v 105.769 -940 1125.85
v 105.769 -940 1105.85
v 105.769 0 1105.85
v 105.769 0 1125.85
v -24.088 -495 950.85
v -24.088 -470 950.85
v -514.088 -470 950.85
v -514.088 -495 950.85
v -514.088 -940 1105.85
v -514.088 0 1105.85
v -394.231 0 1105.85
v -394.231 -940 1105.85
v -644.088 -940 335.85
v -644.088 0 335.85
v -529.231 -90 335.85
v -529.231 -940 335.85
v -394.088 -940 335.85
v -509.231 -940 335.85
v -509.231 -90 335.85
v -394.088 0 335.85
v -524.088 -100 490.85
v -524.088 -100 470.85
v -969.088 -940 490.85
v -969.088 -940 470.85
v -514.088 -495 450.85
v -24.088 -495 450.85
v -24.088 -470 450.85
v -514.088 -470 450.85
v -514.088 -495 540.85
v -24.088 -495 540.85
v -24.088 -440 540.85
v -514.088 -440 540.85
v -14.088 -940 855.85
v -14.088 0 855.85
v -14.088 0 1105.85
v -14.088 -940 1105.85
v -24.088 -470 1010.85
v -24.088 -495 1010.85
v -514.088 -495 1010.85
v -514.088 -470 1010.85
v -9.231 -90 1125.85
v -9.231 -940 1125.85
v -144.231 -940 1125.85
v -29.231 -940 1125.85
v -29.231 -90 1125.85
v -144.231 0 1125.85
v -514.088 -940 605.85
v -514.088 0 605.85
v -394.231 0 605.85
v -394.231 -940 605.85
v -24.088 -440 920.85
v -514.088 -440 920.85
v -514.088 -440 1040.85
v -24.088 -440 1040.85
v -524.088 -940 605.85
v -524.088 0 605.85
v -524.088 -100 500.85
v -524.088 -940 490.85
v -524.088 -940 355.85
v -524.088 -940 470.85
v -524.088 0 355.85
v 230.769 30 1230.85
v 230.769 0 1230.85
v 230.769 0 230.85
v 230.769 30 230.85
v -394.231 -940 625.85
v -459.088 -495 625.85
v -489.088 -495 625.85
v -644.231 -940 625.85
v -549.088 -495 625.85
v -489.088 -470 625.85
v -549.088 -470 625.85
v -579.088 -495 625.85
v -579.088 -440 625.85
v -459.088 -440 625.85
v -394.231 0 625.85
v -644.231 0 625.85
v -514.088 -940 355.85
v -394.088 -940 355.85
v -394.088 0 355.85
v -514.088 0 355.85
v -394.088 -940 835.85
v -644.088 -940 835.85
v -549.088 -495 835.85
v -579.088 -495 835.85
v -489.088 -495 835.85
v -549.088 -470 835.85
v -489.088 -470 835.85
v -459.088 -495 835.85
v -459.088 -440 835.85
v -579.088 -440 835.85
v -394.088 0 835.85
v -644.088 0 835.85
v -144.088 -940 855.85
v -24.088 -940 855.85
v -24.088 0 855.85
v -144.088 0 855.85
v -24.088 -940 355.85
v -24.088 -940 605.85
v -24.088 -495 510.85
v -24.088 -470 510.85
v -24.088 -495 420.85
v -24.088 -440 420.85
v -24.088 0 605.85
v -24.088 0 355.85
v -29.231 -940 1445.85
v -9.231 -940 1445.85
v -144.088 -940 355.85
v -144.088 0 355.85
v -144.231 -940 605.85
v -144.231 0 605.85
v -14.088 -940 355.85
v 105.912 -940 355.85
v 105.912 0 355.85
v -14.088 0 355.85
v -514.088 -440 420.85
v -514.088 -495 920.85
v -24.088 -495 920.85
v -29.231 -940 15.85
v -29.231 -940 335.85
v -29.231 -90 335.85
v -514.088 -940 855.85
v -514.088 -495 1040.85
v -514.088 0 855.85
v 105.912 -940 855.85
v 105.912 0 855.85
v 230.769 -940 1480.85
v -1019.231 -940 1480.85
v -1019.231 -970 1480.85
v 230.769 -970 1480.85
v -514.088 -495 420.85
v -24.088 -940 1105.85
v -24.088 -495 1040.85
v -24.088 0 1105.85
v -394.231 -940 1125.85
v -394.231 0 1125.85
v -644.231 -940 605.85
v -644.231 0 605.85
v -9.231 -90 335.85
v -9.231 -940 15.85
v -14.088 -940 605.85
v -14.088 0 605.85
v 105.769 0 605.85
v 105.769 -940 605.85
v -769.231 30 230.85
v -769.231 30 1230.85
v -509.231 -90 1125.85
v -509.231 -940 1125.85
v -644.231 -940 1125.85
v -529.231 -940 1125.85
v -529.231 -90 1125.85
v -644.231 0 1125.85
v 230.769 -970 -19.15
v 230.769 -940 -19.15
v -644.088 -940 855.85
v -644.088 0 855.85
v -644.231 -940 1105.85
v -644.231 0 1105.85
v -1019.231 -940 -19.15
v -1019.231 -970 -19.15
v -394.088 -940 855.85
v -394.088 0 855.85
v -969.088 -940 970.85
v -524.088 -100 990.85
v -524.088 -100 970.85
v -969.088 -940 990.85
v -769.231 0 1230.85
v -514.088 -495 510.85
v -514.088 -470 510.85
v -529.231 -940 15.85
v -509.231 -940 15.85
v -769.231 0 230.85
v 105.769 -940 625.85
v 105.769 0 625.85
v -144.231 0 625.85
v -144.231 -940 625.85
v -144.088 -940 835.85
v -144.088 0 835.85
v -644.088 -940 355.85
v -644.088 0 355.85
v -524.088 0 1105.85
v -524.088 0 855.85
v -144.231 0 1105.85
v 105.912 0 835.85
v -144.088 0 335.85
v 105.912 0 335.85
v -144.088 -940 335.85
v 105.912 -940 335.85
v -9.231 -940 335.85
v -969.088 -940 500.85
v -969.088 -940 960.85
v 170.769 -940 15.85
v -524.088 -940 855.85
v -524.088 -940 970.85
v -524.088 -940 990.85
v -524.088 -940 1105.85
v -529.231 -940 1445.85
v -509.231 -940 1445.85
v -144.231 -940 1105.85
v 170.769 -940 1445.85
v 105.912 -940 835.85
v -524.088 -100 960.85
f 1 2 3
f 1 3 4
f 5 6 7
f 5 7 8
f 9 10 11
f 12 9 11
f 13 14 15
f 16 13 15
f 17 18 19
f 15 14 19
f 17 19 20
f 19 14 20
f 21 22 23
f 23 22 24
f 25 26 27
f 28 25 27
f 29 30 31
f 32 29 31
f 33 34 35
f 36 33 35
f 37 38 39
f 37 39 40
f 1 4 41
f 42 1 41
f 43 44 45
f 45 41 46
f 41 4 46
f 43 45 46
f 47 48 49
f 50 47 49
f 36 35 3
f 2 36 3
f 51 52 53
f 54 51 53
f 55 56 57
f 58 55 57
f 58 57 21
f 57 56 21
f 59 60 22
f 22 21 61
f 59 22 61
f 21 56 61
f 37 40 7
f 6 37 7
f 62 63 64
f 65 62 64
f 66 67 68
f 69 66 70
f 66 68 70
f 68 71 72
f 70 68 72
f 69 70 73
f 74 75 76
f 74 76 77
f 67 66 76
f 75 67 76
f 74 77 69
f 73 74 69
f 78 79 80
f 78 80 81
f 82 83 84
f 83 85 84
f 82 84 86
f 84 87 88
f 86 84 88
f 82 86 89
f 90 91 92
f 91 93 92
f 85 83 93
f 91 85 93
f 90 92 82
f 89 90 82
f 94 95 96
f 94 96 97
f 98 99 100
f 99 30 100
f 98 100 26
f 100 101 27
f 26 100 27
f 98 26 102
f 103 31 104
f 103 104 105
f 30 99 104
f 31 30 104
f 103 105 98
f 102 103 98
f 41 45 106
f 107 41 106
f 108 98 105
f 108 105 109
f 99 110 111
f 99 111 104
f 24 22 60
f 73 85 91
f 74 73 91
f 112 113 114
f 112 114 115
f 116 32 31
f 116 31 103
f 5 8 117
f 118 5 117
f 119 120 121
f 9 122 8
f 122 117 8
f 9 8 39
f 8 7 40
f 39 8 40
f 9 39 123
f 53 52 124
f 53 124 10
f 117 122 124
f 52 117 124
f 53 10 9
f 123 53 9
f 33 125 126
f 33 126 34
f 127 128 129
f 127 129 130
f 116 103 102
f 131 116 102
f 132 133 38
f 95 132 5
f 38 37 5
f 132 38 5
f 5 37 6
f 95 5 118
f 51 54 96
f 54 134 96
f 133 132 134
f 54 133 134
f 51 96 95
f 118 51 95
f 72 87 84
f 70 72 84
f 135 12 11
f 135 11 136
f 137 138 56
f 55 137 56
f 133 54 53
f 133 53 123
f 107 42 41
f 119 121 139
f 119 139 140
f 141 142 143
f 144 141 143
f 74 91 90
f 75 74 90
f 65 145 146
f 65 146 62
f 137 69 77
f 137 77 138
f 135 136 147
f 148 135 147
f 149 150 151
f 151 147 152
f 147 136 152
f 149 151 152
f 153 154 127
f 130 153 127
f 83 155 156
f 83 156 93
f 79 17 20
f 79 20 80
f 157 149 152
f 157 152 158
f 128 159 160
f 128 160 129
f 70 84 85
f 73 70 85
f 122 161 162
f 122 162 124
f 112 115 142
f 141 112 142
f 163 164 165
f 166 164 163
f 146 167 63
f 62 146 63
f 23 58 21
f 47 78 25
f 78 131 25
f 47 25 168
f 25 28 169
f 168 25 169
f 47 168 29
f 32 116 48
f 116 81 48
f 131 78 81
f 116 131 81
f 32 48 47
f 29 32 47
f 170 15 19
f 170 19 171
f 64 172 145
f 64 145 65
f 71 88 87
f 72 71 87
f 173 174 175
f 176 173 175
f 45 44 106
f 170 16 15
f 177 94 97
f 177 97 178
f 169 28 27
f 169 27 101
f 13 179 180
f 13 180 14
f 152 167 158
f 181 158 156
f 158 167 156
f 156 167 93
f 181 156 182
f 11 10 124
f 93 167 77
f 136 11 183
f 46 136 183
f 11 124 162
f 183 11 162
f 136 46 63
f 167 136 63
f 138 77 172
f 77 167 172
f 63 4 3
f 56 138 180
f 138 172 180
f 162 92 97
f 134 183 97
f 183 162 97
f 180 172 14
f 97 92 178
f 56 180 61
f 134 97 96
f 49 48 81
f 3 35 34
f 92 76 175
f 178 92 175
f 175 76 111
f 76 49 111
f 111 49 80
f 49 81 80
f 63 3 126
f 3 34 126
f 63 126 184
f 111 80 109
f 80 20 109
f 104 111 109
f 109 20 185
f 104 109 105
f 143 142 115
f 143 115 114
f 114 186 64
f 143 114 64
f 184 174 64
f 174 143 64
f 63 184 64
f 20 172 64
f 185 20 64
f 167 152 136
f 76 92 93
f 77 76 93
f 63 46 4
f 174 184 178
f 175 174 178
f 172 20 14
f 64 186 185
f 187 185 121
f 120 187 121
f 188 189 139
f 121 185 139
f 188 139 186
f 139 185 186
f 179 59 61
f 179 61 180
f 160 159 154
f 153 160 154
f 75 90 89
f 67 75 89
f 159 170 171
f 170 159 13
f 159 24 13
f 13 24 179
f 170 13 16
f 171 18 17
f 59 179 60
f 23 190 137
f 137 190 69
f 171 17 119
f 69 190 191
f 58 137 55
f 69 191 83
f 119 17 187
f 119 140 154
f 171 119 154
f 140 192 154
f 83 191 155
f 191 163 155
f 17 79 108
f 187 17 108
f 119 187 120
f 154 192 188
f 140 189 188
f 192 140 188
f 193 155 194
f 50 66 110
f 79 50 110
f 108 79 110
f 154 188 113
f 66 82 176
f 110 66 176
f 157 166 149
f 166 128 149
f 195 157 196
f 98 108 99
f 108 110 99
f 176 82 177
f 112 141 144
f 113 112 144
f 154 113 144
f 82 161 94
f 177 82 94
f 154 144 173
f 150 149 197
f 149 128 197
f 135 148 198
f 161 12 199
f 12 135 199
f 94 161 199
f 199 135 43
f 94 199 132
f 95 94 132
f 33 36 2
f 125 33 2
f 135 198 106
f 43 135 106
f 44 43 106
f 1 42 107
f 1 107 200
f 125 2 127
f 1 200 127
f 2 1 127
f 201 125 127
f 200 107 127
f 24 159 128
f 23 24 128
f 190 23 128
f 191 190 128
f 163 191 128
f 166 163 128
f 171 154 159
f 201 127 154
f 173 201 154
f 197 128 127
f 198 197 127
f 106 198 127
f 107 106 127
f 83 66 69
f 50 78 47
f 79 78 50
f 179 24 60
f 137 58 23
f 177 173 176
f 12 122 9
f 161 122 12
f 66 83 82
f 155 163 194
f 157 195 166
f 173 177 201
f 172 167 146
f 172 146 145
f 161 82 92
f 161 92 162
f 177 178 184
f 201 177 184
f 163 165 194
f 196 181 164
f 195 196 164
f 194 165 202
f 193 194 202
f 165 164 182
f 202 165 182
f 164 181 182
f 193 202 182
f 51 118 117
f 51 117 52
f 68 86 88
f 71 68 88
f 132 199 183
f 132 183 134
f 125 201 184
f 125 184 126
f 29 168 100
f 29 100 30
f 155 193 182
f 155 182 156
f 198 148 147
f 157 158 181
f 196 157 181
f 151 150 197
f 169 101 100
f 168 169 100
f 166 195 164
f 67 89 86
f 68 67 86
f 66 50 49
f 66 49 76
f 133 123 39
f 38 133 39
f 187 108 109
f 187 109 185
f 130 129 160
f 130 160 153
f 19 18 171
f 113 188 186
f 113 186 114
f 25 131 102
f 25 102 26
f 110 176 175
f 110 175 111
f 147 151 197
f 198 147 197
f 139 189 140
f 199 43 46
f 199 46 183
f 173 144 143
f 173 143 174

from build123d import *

# Parameters (mm, degrees)
SKETCH5_W           = 1000
SKETCH5_H           = 1000
BOSS_EXTRUDE1_DEPTH = 30
BOSS_EXTRUDE2_DEPTH = 940
SKETCH7_W           = 1250
SKETCH7_H           = 1500
BOSS_EXTRUDE3_DEPTH = 30
BOSS_EXTRUDE4_DEPTH = 445
CUT_EXTRUDE2_DEPTH  = 30
CUT_EXTRUDE3_DEPTH  = 30
SKETCH12_W          = 20
SKETCH12_H          = 850
BOSS_EXTRUDE5_DEPTH = 320
CUT_EXTRUDE4_DEPTH  = 700
BOSS_EXTRUDE6_DEPTH = 210
BOSS_EXTRUDE7_DEPTH = 490


with BuildPart() as part:
    # Sketch5 → Boss-Extrude1 (new body)
    with BuildSketch(Plane(origin=(0, 0, 0), x_dir=(1, 0, 0), z_dir=(0, 1, 0))):
        with Locations((-269.230769231, -730.850115694)):
            Rectangle(SKETCH5_W, SKETCH5_H)
    extrude(amount=BOSS_EXTRUDE1_DEPTH)

    # Sketch6 → Boss-Extrude2 (add)
    with BuildSketch(Plane.XZ):
        Polygon((-644.230769231, 625.850115694), (-644.230769231, 605.850115694), (-524.088400017, 605.850115694), (-524.088400017, 355.850115694), (-644.088400017, 355.850115694), (-644.088400017, 335.850115694), (-394.088400017, 335.850115694), (-394.088400017, 355.850115694), (-514.088400017, 355.850115694), (-514.088400017, 605.850115694), (-394.230769231, 605.850115694), (-394.230769231, 625.850115694), align=None)
        Polygon((-644.230769231, 1125.850115694), (-644.230769231, 1105.850115694), (-524.088400017, 1105.850115694), (-524.088400017, 855.850115694), (-644.088400017, 855.850115694), (-644.088400017, 835.850115694), (-394.088400017, 835.850115694), (-394.088400017, 855.850115694), (-514.088400017, 855.850115694), (-514.088400017, 1105.850115694), (-394.230769231, 1105.850115694), (-394.230769231, 1125.850115694), align=None)
        Polygon((-144.230769231, 1125.850115694), (-144.230769231, 1105.850115694), (-24.088400017, 1105.850115694), (-24.088400017, 855.850115694), (-144.088400017, 855.850115694), (-144.088400017, 835.850115694), (105.911599983, 835.850115694), (105.911599983, 855.850115694), (-14.088400017, 855.850115694), (-14.088400017, 1105.850115694), (105.769230769, 1105.850115694), (105.769230769, 1125.850115694), align=None)
        Polygon((-144.230769231, 625.850115694), (-144.230769231, 605.850115694), (-24.088400017, 605.850115694), (-24.088400017, 355.850115694), (-144.088400017, 355.850115694), (-144.088400017, 335.850115694), (105.911599983, 335.850115694), (105.911599983, 355.850115694), (-14.088400017, 355.850115694), (-14.088400017, 605.850115694), (105.769230769, 605.850115694), (105.769230769, 625.850115694), align=None)
    extrude(amount=BOSS_EXTRUDE2_DEPTH)

    # Sketch7 → Boss-Extrude3 (add)
    with BuildSketch(Plane.XZ.offset(940)):
        with Locations((-394.230769231, 730.850115694)):
            Rectangle(SKETCH7_W, SKETCH7_H)
    extrude(amount=BOSS_EXTRUDE3_DEPTH)

    # Sketch8 → Boss-Extrude4 (add)
    with BuildSketch(Plane.ZY.offset(524.088400017)):
        Polygon((480.850115694, -100), (470.850115694, -100), (470.850115694, -940), (490.850115694, -940), (490.850115694, -100), align=None)
        Polygon((975.850115694, -100), (970.850115694, -100), (970.850115694, -940), (990.850115694, -940), (990.850115694, -100), align=None)
    extrude(amount=BOSS_EXTRUDE4_DEPTH)

    # Sketch10 → Cut-Extrude2 (cut)
    with BuildSketch(Plane(origin=(0, 0, 470.850115694), x_dir=(-1, 0, 0), z_dir=(0, 0, -1))):
        Polygon((524.088400017, -100), (969.088400017, -940), (969.088400017, -100), align=None)
    extrude(amount=-CUT_EXTRUDE2_DEPTH, mode=Mode.SUBTRACT)

    # Sketch11 → Cut-Extrude3 (cut)
    with BuildSketch(Plane.XY.offset(990.850115694)):
        Polygon((-969.088400017, -100), (-524.088400017, -100), (-969.088400017, -940), align=None)
    extrude(amount=-CUT_EXTRUDE3_DEPTH, mode=Mode.SUBTRACT)

    # Sketch12 → Boss-Extrude5 (add)
    with BuildSketch(Plane.XY.offset(1125.850115694)):
        with Locations((-519.230769231, -515)):
            Rectangle(SKETCH12_W, SKETCH12_H)
        with Locations((-19.230769231, -515)):
            Rectangle(SKETCH12_W, SKETCH12_H)
    boss_extrude5 = extrude(amount=BOSS_EXTRUDE5_DEPTH)

    # Sketch13 → Cut-Extrude4 (cut)
    with BuildSketch(Plane.ZY.offset(529.230769231)):
        Polygon((1125.850115694, -90), (1445.850115694, -940), (1445.850115694, -90), align=None)
    cut_extrude4 = extrude(amount=-CUT_EXTRUDE4_DEPTH, mode=Mode.SUBTRACT)

    # Mirror1: Boss-Extrude5 across plane
    add(boss_extrude5.mirror(Plane(origin=(0, 0, 730.850115694), x_dir=(1, 0, 0), z_dir=(0, 0, -1))))

    # Mirror2: Cut-Extrude4 across plane
    add(cut_extrude4.mirror(Plane(origin=(0, 0, 730.850115694), x_dir=(1, 0, 0), z_dir=(0, 0, -1))), mode=Mode.SUBTRACT)

    # Sketch15 → Boss-Extrude6 (add)
    with BuildSketch(Plane(origin=(0, 0, 835.850115694), x_dir=(-1, 0, 0), z_dir=(0, 0, -1))):
        Polygon((549.088400017, -495), (579.088400017, -495), (579.088400017, -440), (459.088400017, -440), (459.088400017, -495), (489.088400017, -495), (489.088400017, -470), (549.088400017, -470), align=None)
    extrude(amount=BOSS_EXTRUDE6_DEPTH)

    # Sketch18 → Boss-Extrude7 (add)
    with BuildSketch(Plane(origin=(-514.088400017, 0, 0), x_dir=(0, 0, -1), z_dir=(1, 0, 0))):
        Polygon((-950.850115694, -495), (-920.850115694, -495), (-920.850115694, -440), (-1040.850115694, -440), (-1040.850115694, -495), (-1010.850115694, -495), (-1010.850115694, -470), (-950.850115694, -470), align=None)
    boss_extrude7 = extrude(amount=BOSS_EXTRUDE7_DEPTH)

    # Mirror3: Boss-Extrude7 across plane
    add(boss_extrude7.mirror(Plane(origin=(0, 0, 730.850115694), x_dir=(1, 0, 0), z_dir=(0, 0, -1))))


solid = part.part
